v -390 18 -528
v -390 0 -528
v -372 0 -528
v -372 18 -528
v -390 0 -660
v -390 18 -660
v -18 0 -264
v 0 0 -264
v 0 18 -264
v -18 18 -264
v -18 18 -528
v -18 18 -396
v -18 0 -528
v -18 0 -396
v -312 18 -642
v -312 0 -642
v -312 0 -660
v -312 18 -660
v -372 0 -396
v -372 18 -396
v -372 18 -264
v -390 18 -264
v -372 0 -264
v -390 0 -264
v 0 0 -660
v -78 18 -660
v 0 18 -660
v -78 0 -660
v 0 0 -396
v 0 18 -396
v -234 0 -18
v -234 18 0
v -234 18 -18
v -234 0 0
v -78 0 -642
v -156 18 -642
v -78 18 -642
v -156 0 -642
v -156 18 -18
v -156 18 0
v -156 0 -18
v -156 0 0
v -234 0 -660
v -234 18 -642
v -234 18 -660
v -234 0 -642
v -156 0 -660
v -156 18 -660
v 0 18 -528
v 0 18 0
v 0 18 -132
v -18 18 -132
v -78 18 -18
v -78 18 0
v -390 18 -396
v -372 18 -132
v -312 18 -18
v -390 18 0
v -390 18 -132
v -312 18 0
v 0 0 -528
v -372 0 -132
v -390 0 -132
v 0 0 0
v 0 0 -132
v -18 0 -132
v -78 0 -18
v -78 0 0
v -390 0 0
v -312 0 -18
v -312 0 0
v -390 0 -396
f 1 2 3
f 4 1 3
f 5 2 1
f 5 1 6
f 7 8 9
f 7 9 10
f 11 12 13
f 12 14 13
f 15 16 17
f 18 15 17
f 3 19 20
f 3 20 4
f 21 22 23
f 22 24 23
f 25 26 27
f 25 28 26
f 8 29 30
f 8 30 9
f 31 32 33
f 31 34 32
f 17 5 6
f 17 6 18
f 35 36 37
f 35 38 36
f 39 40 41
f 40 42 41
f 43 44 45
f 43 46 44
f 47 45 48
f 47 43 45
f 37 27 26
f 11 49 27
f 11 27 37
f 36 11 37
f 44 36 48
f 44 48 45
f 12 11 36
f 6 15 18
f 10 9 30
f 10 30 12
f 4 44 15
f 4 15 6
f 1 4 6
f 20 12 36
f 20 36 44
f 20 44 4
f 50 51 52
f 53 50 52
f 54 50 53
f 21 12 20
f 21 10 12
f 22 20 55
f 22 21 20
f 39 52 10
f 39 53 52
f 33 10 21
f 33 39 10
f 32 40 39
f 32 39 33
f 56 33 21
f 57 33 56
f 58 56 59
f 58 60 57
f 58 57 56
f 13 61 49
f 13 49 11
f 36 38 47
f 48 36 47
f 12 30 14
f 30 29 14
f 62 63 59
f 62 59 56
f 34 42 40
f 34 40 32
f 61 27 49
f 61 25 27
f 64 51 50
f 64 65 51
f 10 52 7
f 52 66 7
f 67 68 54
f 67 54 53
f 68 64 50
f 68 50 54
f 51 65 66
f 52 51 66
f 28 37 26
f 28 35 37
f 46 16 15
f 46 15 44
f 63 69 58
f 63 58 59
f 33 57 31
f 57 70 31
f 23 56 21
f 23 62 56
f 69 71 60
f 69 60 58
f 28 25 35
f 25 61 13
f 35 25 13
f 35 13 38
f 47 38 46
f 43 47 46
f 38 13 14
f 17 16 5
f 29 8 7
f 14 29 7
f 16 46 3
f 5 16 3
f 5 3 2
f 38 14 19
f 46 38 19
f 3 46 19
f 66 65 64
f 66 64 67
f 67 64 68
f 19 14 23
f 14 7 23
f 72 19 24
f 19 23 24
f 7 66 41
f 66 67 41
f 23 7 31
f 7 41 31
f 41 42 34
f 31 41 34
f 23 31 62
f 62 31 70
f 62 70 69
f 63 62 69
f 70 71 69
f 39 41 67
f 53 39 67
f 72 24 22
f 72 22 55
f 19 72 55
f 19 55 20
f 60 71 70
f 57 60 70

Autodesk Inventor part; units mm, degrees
ref_plane "YZ Plane" through (0, 0, 0) normal (1, 0, 0) x (0, 1, 0)
ref_plane "XZ Plane" through (0, 0, 0) normal (0, 1, 0) x (-1, 0, 0)
ref_plane "XY Plane" through (0, 0, 0) normal (0, 0, 1) x (1, 0, 0)
sketch "Sketch1" plane through (0, 0, 0) normal (0, 1, 0) x (-1, 0, 0)
  line L0 (0, -132) -> (18, -132)
  line L1 (0, -264) -> (18, -264)
  line L2 (0, -396) -> (18, -396)
  line L3 (0, -528) -> (18, -528)
  line L4 (390, -132) -> (372, -132)
  line L5 (390, -264) -> (372, -264)
  line L6 (390, -396) -> (372, -396)
  line L7 (390, -528) -> (372, -528)
  line L8 (0, -132) -> (0, 0)
  line L9 (0, -660) -> (0, -528)
  line L10 (0, -396) -> (0, -264)
  line L11 (390, 0) -> (390, -132)
  line L12 (390, -264) -> (390, -396)
  line L13 (390, -528) -> (390, -660)
  line L14 (372, -132) -> (372, -264)
  line L15 (372, -396) -> (372, -528)
  line L16 (18, -396) -> (18, -528)
  line L17 (18, -132) -> (18, -264)
  line L18 (78, 0) -> (78, -18)
  line L19 (156, 0) -> (156, -18)
  line L20 (234, 0) -> (234, -18)
  line L21 (312, 0) -> (312, -18)
  line L22 (78, -642) -> (78, -660)
  line L23 (156, -642) -> (156, -660)
  line L24 (234, -642) -> (234, -660)
  line L25 (312, -642) -> (312, -660)
  line L26 (0, 0) -> (78, 0)
  line L27 (156, 0) -> (234, 0)
  line L28 (312, 0) -> (390, 0)
  line L29 (312, -18) -> (234, -18)
  line L30 (156, -18) -> (78, -18)
  line L31 (390, -660) -> (312, -660)
  line L32 (234, -660) -> (156, -660)
  line L33 (78, -660) -> (0, -660)
  line L34 (312, -642) -> (234, -642)
  line L35 (156, -642) -> (78, -642)
  dimension "d0" = 660
  dimension "d1" = 390
  dimension "d7" = 132
  dimension "d8" = 132
  dimension "d9" = 132
  dimension "d12" = 132
  dimension "d13" = 132
  dimension "d14" = 132
  dimension "d16" = 18
  dimension "d17" = 18
  dimension "d18" = 18
  dimension "d19" = 18
  dimension "d20" = 18
  dimension "d21" = 18
  dimension "d22" = 18
  dimension "d23" = 18
  dimension "d24" = 78
  dimension "d25" = 78
  dimension "d26" = 78
  dimension "d27" = 78
  dimension "d28" = 78
  dimension "d29" = 78
  dimension "d30" = 78
  dimension "d31" = 18
  dimension "d32" = 18
  dimension "d33" = 18
  dimension "d34" = 18
  dimension "d35" = 18
  dimension "d36" = 18
  dimension "d37" = 18
  dimension "d38" = 18
  dimension "d39" = 132
  dimension "d40" = 132
extrude "Extrusion1" add sketch "Sketch1" along normal blind 18
properties part number "cajon abajo"
